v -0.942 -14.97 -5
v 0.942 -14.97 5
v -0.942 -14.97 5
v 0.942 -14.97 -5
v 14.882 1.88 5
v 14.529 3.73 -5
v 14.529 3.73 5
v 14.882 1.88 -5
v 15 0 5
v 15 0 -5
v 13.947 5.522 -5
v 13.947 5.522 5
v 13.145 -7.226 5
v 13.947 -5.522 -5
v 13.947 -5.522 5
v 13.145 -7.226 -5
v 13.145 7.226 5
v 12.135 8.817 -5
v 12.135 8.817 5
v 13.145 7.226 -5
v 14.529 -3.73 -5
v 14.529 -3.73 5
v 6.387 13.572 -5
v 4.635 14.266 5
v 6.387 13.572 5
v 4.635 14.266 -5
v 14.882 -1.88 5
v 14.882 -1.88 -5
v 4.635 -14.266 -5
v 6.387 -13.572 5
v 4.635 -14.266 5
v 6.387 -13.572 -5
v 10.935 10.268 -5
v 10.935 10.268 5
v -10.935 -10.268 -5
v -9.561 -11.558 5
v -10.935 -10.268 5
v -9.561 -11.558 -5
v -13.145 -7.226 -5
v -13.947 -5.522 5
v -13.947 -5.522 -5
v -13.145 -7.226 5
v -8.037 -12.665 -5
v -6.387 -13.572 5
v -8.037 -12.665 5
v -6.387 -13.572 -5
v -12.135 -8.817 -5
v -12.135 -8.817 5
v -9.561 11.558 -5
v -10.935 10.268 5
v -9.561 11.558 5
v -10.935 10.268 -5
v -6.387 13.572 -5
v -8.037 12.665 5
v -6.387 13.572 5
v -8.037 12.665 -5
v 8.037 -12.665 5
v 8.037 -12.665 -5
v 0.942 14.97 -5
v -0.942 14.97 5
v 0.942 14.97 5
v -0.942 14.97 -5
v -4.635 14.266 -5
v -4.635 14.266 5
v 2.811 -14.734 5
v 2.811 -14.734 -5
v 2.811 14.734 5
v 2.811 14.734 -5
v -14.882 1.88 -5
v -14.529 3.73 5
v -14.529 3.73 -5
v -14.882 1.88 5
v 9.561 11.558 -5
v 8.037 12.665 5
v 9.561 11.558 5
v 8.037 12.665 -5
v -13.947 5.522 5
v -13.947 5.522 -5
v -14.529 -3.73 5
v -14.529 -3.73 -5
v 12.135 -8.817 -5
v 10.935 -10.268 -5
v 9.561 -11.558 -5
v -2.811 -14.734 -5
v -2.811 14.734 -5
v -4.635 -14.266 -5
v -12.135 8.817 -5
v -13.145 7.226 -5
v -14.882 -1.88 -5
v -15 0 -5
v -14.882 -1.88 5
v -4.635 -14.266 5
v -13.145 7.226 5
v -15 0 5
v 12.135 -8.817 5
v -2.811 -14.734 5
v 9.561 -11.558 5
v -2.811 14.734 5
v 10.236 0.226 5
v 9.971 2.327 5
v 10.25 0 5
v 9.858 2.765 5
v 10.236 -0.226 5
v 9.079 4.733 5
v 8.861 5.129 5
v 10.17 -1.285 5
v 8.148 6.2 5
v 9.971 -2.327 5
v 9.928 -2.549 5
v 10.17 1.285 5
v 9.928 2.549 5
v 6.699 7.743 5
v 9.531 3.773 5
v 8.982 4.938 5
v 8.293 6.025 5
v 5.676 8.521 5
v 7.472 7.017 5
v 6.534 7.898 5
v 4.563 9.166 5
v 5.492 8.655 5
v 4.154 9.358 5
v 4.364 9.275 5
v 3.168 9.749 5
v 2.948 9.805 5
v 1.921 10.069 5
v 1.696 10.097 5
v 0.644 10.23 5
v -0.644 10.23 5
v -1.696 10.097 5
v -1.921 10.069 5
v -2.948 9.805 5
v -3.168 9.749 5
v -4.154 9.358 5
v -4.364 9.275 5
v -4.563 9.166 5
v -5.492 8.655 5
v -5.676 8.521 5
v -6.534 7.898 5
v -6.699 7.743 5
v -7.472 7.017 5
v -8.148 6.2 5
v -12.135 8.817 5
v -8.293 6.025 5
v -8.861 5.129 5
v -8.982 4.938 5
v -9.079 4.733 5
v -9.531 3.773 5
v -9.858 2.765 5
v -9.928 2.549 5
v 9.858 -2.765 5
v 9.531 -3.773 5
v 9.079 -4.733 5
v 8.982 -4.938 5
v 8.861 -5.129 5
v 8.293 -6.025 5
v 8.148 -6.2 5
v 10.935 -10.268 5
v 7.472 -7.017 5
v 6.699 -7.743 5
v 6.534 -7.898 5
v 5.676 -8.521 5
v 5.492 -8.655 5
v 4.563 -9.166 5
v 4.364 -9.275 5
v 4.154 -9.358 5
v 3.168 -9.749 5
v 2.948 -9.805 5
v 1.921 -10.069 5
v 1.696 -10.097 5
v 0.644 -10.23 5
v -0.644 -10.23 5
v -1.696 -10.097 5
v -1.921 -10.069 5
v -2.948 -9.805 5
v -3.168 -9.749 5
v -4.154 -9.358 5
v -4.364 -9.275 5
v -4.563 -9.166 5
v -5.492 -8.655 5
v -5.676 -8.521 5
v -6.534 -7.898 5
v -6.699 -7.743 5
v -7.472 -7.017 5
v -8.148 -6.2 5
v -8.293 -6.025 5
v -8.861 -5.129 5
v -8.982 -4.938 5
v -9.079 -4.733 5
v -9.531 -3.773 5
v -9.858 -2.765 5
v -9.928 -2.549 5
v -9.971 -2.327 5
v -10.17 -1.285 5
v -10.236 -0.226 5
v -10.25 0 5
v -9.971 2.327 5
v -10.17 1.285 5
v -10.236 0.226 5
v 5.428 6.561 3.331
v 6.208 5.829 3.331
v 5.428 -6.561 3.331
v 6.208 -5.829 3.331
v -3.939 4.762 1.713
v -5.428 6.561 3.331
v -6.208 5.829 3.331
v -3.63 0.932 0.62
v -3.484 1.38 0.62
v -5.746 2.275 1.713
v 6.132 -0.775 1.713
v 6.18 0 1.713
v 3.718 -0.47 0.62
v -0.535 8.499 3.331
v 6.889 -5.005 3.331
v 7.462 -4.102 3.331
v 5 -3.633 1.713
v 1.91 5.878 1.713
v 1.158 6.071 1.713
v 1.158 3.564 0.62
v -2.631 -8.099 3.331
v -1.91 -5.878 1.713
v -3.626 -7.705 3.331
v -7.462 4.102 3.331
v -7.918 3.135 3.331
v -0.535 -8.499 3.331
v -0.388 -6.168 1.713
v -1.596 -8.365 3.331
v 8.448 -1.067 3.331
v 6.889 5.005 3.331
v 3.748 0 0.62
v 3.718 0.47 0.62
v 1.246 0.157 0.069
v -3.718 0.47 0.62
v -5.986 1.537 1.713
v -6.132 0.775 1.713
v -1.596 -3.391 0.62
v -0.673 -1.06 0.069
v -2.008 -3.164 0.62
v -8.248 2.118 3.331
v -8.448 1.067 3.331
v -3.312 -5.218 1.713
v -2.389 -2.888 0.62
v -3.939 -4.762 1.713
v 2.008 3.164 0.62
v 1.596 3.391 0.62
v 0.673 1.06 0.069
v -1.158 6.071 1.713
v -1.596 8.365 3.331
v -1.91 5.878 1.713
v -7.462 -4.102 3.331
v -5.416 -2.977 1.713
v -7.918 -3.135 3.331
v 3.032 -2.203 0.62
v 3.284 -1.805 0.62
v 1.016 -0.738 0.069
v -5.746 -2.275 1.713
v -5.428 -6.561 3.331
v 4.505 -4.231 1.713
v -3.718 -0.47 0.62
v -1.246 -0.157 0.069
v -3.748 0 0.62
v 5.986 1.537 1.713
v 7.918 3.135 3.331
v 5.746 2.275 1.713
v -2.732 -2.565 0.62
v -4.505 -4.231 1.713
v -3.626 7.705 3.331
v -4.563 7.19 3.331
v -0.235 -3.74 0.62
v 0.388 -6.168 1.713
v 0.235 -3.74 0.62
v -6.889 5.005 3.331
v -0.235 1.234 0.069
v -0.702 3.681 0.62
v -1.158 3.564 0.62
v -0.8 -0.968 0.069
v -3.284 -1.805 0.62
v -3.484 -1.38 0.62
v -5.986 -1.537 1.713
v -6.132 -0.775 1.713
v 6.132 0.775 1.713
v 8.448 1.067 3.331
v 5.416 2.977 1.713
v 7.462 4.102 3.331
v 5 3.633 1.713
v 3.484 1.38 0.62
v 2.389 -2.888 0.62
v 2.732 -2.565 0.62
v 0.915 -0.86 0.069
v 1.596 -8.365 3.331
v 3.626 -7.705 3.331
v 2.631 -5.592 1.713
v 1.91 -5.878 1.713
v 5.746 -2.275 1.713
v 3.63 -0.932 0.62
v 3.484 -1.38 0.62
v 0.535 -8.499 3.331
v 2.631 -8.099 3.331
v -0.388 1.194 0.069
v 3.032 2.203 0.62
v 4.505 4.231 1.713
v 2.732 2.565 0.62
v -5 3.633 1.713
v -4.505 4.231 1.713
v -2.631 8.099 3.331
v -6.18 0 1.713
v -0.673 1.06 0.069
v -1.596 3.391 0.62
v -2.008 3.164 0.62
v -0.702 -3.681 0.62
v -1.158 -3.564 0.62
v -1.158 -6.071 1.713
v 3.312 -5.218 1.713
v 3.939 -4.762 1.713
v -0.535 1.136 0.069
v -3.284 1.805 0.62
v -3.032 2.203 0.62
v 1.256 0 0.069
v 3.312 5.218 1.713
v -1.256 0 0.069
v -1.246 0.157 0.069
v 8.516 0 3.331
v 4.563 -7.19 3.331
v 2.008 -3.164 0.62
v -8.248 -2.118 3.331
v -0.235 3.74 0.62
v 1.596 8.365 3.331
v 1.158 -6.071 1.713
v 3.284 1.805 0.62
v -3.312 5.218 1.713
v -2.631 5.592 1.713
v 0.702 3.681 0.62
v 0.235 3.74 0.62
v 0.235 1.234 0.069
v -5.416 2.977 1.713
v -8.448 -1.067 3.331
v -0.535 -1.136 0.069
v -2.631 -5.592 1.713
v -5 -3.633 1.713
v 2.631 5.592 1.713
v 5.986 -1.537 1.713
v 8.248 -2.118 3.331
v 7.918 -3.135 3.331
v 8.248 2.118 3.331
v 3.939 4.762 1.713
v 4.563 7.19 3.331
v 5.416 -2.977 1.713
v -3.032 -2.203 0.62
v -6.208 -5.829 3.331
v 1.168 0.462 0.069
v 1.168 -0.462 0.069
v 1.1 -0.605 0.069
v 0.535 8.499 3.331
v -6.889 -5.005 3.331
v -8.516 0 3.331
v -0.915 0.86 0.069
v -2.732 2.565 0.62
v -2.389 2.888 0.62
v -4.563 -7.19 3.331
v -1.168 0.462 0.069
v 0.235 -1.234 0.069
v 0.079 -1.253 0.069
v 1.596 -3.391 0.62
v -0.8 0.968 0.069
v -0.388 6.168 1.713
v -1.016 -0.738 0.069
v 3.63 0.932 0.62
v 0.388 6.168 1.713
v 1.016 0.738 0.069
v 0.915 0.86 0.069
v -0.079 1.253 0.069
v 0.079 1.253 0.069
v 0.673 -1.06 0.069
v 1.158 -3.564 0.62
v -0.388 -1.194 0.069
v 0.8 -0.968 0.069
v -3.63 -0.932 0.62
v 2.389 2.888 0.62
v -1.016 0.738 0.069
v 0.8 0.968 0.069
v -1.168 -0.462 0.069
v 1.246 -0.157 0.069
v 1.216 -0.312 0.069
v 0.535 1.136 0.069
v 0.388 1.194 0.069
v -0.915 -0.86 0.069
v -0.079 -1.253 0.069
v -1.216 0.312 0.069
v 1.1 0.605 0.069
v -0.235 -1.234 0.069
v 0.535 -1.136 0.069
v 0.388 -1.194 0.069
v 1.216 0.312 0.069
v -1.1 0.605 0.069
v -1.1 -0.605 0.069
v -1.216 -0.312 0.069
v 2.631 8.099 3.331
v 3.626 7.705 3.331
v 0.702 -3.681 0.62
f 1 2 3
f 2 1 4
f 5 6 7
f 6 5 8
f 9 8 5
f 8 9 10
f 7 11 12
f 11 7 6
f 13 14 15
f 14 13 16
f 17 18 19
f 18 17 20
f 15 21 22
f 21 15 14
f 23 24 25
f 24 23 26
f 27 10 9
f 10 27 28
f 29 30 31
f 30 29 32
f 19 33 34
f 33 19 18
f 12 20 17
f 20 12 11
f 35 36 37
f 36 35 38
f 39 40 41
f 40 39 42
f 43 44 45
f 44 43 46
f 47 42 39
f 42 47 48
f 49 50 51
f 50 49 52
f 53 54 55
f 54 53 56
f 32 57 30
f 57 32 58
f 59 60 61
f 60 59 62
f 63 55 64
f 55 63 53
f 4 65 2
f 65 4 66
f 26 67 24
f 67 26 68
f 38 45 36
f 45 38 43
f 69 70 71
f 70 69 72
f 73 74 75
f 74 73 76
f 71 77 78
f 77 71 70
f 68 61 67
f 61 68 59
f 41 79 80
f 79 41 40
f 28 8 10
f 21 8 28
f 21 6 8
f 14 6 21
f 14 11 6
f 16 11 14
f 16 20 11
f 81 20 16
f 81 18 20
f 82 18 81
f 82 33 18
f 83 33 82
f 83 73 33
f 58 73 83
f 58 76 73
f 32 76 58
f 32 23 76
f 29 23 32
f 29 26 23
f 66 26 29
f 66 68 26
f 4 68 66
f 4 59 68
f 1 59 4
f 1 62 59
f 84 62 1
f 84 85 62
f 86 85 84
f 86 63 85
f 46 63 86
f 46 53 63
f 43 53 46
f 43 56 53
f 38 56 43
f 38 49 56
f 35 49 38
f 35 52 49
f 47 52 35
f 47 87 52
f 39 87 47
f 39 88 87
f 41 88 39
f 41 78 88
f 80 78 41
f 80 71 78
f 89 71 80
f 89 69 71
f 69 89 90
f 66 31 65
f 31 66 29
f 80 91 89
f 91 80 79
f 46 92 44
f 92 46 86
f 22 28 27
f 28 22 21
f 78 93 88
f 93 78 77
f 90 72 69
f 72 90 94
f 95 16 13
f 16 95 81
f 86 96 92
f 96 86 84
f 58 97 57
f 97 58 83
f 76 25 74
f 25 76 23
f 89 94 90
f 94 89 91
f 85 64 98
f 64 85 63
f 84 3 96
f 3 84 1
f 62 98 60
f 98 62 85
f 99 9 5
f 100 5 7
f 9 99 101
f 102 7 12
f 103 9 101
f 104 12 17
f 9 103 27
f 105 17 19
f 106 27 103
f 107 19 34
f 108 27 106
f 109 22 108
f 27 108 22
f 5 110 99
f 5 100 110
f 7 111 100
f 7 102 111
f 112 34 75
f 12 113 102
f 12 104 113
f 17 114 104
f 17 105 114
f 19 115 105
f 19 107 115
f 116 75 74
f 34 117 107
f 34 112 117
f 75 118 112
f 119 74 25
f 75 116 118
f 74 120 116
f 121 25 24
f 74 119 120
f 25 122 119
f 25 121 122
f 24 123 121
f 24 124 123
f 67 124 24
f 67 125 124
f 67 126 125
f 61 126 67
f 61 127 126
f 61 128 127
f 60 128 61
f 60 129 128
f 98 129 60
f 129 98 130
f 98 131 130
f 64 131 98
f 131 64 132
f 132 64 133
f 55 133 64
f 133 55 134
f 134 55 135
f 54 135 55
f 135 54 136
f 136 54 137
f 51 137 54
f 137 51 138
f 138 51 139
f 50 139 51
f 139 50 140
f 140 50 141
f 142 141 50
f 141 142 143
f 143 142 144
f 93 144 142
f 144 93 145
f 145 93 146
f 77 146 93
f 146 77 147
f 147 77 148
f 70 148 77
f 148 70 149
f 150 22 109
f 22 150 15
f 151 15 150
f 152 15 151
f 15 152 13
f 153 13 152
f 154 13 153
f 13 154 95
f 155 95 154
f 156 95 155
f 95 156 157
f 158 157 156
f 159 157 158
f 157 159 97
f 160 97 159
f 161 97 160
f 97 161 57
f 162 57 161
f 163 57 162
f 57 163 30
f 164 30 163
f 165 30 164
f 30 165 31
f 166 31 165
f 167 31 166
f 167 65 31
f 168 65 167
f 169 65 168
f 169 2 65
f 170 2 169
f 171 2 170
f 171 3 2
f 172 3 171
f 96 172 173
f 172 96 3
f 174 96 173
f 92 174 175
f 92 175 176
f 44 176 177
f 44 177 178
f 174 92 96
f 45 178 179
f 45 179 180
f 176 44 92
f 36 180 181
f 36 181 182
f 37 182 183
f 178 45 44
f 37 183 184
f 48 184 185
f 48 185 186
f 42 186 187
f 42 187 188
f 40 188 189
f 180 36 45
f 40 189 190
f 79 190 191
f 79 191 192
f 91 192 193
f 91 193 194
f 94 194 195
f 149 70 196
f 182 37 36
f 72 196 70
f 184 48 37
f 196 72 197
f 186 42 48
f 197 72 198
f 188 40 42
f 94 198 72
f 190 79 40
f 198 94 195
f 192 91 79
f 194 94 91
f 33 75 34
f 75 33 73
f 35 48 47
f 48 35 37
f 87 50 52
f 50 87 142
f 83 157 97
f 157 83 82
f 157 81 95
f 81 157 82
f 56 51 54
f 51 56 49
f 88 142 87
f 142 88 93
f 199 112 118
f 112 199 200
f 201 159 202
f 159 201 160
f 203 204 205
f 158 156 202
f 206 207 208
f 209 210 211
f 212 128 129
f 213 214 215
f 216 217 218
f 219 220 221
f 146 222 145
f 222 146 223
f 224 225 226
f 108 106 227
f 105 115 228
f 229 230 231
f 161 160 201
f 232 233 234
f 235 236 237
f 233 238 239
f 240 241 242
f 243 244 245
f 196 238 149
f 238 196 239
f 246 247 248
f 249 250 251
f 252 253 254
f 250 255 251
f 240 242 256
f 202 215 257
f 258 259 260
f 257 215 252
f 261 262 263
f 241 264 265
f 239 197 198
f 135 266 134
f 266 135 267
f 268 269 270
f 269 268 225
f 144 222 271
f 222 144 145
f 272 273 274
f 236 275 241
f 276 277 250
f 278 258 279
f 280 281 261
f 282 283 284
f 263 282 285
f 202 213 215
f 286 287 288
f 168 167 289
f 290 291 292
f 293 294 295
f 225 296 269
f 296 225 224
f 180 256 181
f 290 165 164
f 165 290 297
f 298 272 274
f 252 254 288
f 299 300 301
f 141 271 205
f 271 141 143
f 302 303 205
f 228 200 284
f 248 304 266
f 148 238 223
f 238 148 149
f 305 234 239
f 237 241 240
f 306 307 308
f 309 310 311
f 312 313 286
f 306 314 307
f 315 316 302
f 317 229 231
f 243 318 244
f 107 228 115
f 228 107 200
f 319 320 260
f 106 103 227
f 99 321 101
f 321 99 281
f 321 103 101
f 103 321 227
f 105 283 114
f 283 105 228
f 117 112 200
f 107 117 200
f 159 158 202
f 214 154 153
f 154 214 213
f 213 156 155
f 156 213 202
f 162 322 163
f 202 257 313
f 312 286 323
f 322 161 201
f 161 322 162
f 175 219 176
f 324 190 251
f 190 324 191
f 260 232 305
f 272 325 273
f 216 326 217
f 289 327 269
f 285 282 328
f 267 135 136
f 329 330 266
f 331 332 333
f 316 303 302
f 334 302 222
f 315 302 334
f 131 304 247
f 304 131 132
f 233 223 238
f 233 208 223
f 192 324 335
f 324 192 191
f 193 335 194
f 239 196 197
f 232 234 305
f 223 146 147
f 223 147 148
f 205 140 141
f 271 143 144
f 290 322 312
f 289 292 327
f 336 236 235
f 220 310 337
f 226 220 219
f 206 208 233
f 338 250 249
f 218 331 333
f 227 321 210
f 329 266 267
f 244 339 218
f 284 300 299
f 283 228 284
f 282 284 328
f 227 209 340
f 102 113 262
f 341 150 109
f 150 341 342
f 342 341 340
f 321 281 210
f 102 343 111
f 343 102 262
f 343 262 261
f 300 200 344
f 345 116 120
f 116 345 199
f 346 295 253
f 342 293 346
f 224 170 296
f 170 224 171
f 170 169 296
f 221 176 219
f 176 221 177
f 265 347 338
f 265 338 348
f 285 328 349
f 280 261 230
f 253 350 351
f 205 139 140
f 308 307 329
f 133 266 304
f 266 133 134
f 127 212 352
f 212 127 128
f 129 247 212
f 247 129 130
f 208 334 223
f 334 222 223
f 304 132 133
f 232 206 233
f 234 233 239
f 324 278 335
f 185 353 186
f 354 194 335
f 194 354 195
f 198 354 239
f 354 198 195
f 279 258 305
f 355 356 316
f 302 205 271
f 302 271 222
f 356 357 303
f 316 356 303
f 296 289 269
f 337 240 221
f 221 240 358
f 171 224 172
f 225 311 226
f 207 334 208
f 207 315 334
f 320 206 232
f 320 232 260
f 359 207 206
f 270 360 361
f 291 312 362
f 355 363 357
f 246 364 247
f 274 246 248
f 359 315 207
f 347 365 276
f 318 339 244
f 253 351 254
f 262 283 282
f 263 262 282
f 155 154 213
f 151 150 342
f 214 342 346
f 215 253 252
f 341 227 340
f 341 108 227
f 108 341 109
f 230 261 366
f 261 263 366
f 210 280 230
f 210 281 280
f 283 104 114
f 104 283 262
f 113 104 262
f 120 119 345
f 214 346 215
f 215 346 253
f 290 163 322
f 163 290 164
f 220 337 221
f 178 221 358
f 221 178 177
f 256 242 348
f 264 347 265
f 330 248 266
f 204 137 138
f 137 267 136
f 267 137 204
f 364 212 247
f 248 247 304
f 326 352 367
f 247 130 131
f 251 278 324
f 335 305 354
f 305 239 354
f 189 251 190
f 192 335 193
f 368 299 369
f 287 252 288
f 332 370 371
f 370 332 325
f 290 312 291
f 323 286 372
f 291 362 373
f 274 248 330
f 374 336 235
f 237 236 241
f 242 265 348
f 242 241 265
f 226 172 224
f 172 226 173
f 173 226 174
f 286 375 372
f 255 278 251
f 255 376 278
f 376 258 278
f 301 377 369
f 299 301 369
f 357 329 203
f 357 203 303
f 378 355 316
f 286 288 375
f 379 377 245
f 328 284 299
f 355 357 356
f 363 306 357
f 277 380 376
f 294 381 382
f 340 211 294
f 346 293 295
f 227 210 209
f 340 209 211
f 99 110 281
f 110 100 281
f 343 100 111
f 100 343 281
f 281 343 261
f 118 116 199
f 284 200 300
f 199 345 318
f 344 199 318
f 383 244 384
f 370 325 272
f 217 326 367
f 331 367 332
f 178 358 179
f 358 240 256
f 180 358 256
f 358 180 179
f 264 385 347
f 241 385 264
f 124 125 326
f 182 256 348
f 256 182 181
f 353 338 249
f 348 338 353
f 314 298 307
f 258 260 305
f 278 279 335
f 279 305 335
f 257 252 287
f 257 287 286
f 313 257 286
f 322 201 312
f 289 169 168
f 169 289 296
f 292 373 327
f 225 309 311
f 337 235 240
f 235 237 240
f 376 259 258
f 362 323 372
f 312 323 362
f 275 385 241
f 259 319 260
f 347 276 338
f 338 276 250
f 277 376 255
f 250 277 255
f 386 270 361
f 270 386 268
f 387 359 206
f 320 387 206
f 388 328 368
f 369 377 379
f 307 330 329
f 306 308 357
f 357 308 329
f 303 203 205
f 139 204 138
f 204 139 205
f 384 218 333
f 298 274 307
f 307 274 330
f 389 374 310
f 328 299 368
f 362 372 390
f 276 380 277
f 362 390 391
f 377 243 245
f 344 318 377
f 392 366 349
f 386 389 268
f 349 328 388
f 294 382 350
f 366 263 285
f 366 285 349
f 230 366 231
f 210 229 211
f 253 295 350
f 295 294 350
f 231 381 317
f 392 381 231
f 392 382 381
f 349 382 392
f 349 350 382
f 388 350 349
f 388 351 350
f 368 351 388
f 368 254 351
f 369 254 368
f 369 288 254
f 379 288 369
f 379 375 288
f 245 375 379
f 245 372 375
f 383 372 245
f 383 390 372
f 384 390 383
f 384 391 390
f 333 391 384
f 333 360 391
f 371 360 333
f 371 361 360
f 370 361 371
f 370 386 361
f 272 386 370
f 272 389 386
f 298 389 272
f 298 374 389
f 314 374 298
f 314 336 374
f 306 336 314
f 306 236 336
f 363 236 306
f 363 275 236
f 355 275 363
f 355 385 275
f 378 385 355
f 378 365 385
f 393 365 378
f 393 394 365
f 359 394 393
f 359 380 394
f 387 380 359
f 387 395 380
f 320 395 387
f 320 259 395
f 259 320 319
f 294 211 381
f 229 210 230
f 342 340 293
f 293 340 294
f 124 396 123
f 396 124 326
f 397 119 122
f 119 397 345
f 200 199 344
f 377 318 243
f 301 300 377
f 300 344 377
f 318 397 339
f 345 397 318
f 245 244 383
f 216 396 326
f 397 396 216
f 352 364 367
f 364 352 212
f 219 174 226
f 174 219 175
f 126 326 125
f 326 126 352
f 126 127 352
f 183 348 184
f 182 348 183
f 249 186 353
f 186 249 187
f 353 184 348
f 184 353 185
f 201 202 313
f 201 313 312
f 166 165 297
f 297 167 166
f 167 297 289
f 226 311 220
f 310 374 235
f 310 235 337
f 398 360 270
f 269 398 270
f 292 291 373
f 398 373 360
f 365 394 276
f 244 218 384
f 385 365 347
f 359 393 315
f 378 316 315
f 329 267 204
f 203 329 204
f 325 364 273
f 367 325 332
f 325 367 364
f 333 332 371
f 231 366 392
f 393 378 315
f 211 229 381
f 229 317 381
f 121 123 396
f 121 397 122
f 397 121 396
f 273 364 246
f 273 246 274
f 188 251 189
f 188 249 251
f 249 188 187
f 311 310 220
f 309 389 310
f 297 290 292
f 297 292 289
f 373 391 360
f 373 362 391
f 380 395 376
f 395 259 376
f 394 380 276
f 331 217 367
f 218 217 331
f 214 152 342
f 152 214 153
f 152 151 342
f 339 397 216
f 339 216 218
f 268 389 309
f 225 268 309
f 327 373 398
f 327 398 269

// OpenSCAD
difference() {
cylinder(10,15,15,true,$fn=50);
translate([0,0,35]) 
    scale([1.0,1.0,1.75]) sphere(r=20, $fn=50); 
}
